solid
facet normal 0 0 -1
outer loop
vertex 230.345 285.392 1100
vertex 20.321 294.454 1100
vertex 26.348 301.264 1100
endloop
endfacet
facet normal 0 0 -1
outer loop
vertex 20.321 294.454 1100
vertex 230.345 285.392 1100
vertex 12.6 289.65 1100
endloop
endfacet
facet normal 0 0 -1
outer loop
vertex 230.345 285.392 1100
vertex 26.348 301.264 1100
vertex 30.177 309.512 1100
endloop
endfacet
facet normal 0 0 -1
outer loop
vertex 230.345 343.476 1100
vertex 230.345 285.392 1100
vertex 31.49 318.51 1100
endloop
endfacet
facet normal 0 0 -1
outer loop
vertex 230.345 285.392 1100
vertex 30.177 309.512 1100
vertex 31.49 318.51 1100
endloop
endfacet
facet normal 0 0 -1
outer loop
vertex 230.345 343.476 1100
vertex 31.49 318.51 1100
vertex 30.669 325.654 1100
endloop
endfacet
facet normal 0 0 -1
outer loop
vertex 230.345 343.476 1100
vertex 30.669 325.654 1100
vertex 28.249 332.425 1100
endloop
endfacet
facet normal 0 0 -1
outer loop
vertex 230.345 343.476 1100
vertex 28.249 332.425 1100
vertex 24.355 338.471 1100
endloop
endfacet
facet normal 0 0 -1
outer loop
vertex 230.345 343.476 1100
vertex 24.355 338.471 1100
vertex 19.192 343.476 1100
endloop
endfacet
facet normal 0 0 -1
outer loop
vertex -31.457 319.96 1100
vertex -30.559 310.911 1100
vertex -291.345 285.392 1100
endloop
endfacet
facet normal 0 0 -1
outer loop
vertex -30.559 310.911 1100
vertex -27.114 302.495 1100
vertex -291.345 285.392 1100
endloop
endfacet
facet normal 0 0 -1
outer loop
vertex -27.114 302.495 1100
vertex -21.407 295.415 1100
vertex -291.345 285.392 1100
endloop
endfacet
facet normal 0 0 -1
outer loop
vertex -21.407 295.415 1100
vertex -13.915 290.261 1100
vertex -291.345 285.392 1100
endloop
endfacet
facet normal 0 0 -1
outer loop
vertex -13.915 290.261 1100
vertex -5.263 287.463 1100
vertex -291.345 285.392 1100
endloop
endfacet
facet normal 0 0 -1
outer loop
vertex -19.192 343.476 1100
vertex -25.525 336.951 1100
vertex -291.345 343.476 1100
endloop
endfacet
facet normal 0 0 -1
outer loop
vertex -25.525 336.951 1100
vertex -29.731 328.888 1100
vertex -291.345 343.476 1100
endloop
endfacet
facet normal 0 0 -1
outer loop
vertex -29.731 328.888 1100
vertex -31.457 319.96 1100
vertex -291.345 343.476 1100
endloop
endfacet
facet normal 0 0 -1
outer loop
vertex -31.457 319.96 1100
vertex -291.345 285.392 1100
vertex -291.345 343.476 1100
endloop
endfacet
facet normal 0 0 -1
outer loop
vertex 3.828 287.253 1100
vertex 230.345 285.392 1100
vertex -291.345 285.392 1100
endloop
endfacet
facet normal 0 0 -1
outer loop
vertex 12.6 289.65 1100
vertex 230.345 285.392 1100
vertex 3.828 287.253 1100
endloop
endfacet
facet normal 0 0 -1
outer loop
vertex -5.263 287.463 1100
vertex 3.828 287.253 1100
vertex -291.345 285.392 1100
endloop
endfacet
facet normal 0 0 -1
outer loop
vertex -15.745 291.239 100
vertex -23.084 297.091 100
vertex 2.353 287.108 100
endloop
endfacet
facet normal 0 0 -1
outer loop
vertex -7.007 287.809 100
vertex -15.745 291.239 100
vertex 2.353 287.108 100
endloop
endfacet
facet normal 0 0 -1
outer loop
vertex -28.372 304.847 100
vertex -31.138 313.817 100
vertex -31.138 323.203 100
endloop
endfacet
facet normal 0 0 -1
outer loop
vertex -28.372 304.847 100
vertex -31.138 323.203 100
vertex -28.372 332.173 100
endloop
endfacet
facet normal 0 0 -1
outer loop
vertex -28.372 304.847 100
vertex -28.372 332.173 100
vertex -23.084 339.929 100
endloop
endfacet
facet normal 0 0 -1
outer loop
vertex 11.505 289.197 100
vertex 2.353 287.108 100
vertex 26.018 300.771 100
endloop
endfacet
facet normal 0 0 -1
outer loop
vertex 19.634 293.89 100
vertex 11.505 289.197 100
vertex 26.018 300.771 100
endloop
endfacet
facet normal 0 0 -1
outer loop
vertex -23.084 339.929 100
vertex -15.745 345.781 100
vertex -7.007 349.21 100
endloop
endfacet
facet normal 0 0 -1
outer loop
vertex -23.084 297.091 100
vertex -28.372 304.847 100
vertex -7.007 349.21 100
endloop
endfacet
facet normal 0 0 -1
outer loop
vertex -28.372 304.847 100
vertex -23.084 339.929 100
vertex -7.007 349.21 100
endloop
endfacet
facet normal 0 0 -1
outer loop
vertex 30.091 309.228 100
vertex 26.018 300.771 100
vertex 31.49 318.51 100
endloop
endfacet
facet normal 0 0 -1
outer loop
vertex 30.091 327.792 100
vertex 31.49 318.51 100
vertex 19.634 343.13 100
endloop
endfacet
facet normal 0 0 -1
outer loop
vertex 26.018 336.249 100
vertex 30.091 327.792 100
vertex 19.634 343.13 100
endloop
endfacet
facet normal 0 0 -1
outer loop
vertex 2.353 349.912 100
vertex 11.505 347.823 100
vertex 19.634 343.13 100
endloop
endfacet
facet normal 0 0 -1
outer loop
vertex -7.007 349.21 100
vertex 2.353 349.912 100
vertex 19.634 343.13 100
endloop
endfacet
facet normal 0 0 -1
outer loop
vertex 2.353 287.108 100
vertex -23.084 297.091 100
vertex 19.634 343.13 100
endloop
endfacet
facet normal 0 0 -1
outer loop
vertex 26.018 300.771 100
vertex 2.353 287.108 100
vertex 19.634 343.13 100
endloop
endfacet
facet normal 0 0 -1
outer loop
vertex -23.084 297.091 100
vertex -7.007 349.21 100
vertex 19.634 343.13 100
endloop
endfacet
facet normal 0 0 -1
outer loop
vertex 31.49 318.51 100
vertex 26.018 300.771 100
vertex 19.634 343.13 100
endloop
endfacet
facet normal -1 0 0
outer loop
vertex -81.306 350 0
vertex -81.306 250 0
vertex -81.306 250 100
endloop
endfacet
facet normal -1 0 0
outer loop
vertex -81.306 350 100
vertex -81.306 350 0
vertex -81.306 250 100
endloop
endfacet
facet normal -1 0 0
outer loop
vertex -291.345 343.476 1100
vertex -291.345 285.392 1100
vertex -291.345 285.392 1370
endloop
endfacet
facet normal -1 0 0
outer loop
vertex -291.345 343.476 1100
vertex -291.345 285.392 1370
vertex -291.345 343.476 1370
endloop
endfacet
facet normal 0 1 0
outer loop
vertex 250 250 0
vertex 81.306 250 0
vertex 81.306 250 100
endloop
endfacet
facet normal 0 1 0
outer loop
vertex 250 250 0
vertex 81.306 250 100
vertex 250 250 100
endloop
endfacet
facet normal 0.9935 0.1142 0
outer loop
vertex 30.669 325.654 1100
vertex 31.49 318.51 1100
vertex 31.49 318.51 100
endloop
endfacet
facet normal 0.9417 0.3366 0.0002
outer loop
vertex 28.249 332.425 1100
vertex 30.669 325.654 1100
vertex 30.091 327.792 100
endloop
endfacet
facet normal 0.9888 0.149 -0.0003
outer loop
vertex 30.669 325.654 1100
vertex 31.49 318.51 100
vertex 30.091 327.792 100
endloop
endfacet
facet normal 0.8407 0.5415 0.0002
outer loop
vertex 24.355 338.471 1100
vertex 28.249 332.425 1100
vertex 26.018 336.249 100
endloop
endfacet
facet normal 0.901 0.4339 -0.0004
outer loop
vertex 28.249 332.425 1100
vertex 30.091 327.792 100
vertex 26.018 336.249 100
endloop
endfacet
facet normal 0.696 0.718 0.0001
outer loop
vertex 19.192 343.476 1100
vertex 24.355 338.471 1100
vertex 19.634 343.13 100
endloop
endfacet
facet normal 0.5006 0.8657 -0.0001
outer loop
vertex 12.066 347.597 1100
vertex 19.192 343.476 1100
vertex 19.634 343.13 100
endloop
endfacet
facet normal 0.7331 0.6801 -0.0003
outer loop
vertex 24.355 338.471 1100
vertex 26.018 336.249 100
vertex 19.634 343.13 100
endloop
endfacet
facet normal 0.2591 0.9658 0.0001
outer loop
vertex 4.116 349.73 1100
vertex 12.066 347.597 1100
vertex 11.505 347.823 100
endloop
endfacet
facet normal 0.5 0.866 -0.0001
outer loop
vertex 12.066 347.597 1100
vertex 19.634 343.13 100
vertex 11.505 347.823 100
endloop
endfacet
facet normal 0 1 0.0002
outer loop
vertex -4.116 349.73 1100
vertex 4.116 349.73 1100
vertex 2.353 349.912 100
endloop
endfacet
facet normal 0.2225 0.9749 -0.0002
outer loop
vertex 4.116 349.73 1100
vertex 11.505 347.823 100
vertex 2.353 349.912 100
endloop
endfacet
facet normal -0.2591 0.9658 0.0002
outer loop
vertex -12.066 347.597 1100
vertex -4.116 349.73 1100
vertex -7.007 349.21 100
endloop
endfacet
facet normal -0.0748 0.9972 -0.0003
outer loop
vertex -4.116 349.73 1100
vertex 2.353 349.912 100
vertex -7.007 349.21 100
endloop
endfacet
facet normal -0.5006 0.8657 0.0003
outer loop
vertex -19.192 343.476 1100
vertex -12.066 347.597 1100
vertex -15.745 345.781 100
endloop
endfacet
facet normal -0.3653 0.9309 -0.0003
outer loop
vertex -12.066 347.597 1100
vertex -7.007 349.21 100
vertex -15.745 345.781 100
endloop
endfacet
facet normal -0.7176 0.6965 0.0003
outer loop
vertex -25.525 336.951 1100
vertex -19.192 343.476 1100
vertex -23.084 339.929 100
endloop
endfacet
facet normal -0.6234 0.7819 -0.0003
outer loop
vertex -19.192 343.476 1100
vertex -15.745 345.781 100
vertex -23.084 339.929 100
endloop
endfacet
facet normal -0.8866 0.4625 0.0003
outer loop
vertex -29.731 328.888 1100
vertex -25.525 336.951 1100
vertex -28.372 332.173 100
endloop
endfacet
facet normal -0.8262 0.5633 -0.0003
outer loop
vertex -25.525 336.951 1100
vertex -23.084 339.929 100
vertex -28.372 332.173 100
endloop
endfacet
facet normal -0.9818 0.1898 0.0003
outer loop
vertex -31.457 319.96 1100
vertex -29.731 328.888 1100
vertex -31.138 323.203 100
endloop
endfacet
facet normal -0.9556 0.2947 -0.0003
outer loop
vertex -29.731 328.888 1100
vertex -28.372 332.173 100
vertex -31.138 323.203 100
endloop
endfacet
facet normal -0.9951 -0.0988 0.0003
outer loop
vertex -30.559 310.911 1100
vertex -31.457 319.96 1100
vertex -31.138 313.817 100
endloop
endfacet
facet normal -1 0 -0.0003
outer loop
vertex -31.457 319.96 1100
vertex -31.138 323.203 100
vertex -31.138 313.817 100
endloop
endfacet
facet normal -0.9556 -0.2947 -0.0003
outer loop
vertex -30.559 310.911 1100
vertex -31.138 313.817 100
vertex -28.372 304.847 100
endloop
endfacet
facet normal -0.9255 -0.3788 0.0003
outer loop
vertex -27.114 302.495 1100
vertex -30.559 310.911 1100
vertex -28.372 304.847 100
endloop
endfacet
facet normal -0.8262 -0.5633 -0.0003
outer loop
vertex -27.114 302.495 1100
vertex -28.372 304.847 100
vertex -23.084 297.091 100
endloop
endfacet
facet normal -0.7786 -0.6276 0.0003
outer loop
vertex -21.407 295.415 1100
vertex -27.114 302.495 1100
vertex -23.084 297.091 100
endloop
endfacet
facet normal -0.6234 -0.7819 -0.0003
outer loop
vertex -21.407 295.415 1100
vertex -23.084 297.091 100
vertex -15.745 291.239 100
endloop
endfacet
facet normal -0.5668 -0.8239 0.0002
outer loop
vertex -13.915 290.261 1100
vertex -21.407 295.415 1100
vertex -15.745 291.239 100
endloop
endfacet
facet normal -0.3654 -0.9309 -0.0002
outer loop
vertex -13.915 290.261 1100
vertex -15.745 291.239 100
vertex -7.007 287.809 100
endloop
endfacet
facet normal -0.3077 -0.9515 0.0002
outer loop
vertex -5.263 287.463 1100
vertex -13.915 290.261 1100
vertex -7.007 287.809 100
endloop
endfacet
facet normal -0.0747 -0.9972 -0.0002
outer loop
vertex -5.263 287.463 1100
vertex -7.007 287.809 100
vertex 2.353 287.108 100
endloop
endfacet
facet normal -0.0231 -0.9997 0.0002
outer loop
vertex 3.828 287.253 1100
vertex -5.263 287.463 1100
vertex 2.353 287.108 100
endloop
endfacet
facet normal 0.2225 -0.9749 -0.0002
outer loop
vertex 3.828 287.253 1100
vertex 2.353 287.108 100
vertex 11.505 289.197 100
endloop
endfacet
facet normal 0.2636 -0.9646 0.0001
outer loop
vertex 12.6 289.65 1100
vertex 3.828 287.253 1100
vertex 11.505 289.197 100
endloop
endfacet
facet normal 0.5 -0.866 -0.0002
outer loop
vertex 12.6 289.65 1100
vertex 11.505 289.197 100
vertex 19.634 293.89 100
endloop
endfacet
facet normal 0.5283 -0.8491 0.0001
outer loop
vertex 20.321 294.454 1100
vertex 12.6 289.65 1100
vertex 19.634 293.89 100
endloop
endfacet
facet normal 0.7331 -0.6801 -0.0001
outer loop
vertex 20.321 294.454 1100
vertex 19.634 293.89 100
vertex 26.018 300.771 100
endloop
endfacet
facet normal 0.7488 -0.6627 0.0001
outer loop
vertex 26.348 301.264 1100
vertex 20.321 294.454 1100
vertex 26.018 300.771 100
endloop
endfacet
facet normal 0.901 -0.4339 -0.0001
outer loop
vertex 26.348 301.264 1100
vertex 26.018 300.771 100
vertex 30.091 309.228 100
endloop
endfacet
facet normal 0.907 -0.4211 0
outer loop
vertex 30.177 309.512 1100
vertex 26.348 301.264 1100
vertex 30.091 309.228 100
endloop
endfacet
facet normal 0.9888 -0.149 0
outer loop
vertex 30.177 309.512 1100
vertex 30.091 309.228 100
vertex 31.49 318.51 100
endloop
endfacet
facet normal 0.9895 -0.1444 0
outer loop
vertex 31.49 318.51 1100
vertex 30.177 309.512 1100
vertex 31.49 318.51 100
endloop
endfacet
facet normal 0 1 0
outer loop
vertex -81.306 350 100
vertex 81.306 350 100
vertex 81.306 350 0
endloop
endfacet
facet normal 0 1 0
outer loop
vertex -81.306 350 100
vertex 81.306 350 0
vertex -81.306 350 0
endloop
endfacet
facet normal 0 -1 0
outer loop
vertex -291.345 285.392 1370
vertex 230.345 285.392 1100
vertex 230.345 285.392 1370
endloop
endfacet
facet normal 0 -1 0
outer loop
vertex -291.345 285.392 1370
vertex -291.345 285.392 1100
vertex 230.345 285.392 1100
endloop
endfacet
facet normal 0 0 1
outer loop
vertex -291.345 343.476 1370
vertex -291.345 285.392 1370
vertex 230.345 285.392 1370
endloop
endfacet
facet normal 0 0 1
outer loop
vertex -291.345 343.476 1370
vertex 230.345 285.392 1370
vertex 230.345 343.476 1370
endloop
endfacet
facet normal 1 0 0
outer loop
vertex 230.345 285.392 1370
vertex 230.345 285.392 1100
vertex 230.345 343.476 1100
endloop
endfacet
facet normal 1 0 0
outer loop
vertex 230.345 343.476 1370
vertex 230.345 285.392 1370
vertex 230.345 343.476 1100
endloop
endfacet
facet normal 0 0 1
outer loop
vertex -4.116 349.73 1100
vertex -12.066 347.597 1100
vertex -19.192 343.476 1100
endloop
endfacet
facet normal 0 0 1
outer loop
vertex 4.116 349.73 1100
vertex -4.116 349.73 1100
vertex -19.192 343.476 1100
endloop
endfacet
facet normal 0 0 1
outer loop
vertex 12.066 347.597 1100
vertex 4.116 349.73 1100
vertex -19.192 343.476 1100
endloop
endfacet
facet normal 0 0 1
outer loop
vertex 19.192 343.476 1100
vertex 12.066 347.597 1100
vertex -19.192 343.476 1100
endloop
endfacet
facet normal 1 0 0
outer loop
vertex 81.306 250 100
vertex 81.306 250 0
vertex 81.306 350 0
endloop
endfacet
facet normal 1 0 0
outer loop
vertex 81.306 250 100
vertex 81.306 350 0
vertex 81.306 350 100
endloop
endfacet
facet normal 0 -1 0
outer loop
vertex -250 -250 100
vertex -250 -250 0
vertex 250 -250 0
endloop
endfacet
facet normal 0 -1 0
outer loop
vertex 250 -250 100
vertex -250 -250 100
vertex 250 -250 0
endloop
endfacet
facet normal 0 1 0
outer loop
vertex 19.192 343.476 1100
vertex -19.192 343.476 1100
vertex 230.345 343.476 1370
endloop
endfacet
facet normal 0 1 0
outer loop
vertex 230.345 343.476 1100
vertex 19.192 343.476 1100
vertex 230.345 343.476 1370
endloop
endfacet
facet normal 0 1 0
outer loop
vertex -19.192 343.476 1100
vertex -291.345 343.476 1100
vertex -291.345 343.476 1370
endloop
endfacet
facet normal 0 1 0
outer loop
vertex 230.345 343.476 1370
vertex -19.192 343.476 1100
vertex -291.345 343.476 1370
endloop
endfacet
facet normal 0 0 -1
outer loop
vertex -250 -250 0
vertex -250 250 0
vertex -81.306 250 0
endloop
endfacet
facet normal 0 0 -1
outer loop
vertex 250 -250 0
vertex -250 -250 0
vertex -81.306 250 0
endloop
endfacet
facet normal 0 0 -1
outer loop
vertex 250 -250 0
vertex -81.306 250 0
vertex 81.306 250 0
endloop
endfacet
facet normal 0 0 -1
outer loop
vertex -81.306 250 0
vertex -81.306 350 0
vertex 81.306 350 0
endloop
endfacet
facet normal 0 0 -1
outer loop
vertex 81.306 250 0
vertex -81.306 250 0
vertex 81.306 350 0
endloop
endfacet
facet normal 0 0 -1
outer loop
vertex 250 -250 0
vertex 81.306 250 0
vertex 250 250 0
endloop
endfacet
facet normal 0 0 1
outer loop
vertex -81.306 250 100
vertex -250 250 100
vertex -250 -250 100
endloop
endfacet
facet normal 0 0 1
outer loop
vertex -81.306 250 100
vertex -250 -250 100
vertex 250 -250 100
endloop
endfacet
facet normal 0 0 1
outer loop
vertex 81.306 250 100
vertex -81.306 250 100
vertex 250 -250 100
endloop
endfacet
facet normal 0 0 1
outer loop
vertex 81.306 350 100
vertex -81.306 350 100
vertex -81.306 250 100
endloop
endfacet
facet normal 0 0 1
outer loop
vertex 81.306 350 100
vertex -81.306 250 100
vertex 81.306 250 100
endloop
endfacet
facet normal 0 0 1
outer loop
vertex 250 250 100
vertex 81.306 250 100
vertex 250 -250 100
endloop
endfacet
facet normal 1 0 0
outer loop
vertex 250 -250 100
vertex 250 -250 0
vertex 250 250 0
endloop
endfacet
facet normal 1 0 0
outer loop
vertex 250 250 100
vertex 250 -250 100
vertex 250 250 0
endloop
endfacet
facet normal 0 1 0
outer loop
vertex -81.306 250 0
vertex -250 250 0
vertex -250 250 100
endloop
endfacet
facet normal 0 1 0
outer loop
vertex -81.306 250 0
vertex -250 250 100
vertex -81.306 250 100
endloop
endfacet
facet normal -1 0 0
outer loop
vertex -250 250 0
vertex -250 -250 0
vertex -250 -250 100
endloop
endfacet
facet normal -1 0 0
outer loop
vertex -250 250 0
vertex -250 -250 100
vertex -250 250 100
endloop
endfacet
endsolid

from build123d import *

# Parameters (mm, degrees)
F0_W     = 500
F0_H     = 500
F1_DEPTH = 100
F2_W     = 162.6115292311
F2_H     = 100
F3_DEPTH = 100
F4_R     = 31.4900843507
F5_DEPTH = 1000
F6_W     = 292.6908135414
F6_H     = 58.0843091011
F7_DEPTH = 270
F8_DEPTH = 145
F9_DEPTH = 84


with BuildPart() as f1:
    # F0 (on Top) → F1 (new body)
    with BuildSketch(Plane.XY):
        Rectangle(F0_W, F0_H)
    extrude(amount=F1_DEPTH)

    # F2 (on face) → F3 (join)
    with BuildSketch(Plane(origin=(0, 250, 0), x_dir=(-1, 0, 0), z_dir=(0, 1, 0))):
        with Locations((0, 50)):
            Rectangle(F2_W, F2_H)
    extrude(amount=F3_DEPTH)


with BuildPart() as f5:
    # F4 (on face) → F5 (new body)
    with BuildSketch(Plane.XY.offset(100)):
        with Locations((0, 318.5099156493)):
            Circle(F4_R)
    extrude(amount=F5_DEPTH)

    # F6 (on face) → F7 (join)
    with BuildSketch(Plane.XY.offset(1100)):
        with Locations((0, 314.4339323044)):
            Rectangle(F6_W, F6_H)
    extrude(amount=F7_DEPTH)

    # F8 (add): a face of the model
    f8_faces = [f5.faces().sort_by_distance(p)[0] for p in [
        (-146.3454067707, 314.4339323044, 1235),
    ]]
    extrude(f8_faces, amount=F8_DEPTH)

    # F9 (add): a face of the model
    f9_faces = [f5.faces().sort_by_distance(p)[0] for p in [
        (146.3454067707, 314.4339323044, 1235),
    ]]
    extrude(f9_faces, amount=F9_DEPTH)


solid = Compound([f1.part, f5.part])
